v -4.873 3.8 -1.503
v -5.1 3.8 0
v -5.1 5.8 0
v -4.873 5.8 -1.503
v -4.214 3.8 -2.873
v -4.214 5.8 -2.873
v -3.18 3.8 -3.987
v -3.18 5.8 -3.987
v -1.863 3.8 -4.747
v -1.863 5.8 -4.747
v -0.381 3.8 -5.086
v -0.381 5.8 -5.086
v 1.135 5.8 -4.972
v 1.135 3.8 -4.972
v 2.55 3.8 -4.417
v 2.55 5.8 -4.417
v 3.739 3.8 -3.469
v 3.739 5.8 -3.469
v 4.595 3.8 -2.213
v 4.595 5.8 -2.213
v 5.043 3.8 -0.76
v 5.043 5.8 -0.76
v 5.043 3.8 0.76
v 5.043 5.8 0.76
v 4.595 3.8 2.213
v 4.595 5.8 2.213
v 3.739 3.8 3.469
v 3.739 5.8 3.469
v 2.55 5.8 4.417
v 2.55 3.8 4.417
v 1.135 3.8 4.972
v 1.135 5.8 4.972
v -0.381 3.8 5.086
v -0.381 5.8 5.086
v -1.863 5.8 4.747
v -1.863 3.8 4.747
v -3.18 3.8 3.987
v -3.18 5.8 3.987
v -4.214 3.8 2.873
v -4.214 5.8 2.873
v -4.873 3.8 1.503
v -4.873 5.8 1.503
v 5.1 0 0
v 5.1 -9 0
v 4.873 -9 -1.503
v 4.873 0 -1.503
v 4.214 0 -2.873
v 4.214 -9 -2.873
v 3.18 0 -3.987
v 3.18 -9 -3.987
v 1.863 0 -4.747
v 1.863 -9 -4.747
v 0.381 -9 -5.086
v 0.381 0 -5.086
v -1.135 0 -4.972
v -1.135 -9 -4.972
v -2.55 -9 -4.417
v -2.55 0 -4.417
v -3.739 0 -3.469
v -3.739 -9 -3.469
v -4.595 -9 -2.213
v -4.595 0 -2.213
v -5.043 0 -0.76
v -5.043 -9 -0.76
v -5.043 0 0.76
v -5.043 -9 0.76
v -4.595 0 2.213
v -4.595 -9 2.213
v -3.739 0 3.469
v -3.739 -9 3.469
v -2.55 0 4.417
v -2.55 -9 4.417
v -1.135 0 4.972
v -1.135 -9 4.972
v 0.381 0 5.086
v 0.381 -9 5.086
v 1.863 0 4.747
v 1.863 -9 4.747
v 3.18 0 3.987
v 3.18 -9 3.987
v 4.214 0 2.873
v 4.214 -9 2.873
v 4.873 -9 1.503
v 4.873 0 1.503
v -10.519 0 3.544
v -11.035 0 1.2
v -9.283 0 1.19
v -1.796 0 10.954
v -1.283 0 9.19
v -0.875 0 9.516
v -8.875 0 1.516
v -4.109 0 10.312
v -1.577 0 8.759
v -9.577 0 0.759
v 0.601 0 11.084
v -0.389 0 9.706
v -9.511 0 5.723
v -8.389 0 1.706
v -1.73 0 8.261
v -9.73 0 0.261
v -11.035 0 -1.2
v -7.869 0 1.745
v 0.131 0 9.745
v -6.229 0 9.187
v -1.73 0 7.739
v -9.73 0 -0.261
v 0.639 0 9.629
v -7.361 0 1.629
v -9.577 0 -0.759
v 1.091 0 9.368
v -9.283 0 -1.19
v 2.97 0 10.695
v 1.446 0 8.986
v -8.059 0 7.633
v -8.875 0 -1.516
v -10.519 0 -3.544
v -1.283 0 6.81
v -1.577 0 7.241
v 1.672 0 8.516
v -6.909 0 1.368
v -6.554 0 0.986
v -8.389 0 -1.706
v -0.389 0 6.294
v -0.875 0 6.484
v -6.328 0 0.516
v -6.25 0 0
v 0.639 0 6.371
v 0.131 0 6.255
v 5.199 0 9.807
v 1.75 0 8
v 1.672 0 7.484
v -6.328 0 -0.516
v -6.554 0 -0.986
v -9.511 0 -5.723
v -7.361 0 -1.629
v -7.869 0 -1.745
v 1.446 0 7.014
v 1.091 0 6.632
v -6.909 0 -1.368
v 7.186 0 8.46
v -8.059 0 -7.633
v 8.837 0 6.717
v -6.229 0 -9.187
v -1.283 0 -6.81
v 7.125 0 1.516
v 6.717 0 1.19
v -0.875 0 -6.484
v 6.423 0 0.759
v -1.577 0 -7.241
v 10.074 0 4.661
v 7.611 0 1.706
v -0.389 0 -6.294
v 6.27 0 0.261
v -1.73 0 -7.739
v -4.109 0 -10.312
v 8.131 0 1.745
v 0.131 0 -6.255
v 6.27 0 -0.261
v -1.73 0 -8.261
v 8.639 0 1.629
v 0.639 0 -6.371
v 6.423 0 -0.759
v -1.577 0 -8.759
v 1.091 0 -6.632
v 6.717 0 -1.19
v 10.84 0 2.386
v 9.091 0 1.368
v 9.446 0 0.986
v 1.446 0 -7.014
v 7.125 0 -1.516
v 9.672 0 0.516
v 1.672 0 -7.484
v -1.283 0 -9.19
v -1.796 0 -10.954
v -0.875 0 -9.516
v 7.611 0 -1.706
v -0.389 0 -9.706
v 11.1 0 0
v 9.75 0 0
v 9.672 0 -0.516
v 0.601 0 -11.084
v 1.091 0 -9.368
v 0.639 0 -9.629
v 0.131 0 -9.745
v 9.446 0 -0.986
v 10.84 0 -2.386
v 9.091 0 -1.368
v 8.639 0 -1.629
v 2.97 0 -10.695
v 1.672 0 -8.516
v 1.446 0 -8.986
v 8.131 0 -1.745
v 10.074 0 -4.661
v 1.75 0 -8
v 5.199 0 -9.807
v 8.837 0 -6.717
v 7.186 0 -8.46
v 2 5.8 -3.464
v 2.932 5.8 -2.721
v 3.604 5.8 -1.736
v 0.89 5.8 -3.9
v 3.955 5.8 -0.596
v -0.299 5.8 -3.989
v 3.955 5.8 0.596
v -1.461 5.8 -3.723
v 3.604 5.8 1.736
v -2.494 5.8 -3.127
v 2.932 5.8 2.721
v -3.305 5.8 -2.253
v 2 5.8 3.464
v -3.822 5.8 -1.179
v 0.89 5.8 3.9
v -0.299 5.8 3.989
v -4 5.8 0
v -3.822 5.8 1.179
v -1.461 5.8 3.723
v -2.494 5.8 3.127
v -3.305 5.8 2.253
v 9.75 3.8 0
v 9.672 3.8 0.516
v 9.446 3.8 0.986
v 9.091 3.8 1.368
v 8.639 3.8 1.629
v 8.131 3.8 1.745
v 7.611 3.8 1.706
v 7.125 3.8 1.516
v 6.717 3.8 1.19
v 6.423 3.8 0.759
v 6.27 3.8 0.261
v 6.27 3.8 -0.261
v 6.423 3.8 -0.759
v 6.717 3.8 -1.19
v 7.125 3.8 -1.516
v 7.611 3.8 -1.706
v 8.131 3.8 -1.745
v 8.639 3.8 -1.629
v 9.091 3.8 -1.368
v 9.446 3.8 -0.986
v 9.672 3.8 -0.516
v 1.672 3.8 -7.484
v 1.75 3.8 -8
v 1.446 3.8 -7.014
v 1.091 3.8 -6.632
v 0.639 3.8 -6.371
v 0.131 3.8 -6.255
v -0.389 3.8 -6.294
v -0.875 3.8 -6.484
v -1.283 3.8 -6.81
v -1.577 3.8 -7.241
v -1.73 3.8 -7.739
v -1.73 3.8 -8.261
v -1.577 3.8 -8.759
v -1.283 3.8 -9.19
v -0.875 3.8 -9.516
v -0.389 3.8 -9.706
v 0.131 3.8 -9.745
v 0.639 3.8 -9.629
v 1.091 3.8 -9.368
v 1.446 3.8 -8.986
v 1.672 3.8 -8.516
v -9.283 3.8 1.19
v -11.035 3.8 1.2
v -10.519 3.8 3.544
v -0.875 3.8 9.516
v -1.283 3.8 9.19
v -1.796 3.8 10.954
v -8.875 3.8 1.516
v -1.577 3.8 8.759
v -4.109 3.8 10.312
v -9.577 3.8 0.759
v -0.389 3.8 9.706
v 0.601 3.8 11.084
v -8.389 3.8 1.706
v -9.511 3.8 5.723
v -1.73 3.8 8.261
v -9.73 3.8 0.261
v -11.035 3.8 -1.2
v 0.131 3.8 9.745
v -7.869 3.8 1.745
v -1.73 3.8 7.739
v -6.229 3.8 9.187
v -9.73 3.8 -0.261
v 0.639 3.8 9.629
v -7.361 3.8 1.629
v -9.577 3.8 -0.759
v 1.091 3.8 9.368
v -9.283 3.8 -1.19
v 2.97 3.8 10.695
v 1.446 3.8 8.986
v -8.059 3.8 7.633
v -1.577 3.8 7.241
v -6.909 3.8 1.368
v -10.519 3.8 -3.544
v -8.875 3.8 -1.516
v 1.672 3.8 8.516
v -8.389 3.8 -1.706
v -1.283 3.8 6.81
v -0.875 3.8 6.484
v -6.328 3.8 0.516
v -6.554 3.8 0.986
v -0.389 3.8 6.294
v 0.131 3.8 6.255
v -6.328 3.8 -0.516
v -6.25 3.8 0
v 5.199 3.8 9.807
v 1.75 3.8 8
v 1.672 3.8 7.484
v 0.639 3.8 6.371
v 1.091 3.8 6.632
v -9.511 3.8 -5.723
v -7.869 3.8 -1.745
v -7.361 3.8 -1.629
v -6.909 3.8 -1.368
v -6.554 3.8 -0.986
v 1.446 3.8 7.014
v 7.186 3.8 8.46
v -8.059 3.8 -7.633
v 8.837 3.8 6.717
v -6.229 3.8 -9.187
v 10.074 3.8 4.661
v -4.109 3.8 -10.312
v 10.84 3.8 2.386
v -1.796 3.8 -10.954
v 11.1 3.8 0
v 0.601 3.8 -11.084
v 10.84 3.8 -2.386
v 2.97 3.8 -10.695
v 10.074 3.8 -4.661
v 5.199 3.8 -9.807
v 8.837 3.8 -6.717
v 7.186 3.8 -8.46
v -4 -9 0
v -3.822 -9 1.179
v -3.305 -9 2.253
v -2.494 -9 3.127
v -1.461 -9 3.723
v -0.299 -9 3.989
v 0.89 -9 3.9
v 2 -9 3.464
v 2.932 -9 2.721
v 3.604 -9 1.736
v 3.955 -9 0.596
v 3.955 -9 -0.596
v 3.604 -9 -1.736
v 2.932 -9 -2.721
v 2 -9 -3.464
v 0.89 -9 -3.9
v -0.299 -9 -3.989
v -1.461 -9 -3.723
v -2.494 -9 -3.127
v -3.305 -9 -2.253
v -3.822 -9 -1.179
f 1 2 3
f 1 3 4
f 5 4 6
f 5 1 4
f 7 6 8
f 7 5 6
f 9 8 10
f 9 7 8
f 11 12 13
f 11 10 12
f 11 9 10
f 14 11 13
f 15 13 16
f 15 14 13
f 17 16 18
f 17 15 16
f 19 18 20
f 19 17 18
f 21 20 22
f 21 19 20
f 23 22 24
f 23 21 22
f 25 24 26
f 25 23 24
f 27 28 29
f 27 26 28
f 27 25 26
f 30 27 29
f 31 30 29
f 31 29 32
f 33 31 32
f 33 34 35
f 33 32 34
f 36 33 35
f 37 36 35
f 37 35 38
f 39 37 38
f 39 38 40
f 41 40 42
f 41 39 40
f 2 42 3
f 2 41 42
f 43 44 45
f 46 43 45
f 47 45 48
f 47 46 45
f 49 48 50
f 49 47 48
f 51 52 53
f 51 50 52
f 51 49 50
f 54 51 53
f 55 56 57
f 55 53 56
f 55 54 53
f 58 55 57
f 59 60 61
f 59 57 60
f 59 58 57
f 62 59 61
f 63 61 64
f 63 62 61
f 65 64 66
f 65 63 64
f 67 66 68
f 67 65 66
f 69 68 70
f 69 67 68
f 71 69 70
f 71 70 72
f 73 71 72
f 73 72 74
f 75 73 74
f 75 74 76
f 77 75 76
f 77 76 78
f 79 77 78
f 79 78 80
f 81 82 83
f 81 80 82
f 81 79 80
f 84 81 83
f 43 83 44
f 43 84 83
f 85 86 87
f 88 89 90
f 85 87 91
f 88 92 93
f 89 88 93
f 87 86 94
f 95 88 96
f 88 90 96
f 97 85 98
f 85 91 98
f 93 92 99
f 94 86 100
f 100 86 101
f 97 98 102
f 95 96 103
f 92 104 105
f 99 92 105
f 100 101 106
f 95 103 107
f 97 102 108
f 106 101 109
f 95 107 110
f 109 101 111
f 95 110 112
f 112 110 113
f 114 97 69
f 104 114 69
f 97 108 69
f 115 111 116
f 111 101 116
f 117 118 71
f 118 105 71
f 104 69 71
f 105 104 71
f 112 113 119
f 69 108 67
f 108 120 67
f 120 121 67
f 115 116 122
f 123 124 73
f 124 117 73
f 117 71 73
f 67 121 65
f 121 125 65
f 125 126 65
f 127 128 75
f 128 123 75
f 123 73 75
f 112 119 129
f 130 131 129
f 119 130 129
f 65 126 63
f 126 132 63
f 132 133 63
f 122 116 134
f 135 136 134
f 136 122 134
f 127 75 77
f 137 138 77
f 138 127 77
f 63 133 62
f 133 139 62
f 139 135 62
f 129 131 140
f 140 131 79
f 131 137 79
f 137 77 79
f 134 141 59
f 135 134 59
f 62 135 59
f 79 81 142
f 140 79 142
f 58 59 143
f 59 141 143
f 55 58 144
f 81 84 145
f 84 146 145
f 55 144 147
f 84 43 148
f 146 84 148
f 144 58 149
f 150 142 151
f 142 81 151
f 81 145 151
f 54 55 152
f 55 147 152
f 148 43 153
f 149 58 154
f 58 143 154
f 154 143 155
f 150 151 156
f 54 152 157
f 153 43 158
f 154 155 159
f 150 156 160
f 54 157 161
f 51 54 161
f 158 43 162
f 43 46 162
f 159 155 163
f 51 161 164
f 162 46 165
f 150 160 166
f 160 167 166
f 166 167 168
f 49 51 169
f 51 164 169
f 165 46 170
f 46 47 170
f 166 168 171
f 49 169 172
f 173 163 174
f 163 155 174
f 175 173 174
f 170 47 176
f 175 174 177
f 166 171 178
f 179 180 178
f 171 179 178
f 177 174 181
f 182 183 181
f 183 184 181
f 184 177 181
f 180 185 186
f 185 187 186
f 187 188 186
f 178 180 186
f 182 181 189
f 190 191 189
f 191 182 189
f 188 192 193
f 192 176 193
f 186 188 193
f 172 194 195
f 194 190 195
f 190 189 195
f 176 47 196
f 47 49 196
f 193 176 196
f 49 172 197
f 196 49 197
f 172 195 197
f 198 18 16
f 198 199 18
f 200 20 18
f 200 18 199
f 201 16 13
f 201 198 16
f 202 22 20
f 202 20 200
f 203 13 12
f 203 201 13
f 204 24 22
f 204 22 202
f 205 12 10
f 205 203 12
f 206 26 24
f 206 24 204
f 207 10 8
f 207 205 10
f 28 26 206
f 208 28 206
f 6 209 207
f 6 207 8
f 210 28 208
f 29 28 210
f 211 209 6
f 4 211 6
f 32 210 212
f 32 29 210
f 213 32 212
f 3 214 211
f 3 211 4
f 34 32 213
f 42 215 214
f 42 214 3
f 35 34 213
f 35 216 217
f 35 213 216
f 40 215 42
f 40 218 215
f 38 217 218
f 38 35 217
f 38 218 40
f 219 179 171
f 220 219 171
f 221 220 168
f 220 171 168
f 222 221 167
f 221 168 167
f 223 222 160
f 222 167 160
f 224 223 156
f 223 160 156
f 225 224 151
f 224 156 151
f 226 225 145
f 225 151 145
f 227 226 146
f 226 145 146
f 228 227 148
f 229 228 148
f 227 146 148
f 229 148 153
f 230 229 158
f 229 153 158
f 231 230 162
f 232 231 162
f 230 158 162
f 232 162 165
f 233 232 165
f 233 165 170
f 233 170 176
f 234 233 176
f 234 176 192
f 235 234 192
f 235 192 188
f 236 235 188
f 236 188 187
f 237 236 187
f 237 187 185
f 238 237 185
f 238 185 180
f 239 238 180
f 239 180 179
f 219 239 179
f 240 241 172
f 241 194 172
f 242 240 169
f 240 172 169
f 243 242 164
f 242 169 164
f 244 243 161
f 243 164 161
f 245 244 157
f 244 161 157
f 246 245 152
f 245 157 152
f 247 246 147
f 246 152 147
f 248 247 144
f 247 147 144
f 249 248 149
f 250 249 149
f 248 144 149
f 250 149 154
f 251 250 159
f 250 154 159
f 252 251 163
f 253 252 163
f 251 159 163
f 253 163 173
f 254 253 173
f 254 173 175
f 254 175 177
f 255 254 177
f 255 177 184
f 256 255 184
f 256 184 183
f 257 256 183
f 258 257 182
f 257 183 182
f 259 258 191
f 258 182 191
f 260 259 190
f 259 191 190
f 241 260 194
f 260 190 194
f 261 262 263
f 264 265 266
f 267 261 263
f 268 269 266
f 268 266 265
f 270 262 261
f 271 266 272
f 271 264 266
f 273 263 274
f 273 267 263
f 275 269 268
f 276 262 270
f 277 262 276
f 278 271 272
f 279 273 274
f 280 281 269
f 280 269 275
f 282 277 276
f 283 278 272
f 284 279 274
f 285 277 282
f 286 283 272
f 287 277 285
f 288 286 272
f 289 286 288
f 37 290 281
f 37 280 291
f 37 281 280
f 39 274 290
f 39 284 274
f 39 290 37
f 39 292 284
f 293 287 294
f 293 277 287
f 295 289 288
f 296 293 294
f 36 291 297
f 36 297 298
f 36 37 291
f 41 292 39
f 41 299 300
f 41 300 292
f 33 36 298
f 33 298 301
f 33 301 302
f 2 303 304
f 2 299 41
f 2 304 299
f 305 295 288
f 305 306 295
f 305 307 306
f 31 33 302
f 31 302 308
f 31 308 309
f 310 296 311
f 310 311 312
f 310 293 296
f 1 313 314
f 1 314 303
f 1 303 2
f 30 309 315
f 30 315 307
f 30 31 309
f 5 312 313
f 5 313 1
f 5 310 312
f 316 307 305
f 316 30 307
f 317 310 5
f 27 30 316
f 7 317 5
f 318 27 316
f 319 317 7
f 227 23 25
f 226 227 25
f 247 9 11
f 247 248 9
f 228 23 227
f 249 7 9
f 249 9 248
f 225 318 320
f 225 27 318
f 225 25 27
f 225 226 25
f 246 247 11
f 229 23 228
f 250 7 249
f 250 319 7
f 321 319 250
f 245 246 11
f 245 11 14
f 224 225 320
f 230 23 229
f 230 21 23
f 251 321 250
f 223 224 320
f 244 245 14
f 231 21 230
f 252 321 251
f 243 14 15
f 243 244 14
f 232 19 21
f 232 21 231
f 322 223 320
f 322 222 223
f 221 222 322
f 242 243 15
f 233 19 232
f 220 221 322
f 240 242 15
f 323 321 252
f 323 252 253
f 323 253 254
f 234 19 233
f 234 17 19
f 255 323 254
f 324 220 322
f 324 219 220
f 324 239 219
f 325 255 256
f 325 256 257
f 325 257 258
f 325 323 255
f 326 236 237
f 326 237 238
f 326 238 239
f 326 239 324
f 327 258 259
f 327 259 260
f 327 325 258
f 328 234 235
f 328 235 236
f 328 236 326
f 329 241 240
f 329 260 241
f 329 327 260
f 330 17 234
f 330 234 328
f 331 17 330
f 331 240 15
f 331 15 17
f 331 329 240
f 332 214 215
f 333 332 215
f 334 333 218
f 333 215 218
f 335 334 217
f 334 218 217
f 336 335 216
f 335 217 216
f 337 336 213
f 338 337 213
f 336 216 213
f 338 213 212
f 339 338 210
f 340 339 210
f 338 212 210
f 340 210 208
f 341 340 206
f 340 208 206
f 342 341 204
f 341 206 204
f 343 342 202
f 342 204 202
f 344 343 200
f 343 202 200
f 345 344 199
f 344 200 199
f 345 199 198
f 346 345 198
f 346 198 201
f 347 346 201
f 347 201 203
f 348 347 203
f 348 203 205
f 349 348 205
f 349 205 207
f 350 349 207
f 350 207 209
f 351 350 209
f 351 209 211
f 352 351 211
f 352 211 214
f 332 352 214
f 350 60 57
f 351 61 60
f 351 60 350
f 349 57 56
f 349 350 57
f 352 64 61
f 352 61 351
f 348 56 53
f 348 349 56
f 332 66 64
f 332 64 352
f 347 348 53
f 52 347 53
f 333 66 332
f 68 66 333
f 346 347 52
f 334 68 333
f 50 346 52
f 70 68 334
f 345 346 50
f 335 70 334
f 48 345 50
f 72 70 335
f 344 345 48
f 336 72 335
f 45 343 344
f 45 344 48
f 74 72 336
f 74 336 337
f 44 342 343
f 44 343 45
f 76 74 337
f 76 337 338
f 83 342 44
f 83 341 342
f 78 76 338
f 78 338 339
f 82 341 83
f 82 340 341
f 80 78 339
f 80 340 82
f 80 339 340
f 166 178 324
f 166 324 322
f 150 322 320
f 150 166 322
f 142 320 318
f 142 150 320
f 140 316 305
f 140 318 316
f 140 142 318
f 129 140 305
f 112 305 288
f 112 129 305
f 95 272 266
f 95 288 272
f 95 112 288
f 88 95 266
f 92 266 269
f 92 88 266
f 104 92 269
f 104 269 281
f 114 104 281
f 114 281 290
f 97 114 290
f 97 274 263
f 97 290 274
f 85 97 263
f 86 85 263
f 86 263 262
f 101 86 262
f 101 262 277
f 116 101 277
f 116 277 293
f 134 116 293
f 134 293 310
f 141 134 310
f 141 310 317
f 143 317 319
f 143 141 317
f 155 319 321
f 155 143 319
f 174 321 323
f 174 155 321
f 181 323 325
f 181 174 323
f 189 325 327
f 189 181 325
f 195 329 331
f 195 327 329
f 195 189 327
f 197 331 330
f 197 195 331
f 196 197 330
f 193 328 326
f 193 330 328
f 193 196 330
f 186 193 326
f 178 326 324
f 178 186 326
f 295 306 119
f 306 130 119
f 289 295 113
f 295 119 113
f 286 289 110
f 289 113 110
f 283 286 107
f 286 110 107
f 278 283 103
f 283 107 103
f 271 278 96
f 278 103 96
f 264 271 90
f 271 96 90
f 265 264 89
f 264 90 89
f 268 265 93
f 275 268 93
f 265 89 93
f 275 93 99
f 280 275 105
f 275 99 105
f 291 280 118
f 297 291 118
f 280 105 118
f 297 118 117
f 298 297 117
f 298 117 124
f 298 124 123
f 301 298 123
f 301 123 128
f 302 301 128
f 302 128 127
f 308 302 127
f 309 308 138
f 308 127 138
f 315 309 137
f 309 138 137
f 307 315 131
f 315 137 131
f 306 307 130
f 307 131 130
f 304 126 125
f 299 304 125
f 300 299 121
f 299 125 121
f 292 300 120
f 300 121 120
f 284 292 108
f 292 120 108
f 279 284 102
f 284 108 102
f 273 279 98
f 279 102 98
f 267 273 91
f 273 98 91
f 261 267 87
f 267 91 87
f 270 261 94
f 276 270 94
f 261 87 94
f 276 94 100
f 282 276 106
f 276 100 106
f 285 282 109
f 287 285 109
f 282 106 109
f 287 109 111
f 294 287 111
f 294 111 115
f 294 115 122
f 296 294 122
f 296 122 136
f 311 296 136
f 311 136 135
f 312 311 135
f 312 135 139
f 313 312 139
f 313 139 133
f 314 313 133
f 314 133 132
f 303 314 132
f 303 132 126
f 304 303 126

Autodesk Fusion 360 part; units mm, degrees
sketch "Sketch1" plane through (0, 0, 0) normal (0, 1, 0) x (1, 0, 0)
  circle A0 centre (0, 0) radius 11.1
  dimension "d1" = 22.2
extrude "Extrude1" add sketch "Sketch1" along normal blind 3.8
sketch "Sketch2" plane through (0, 0, 0) normal (0, -1, 0) x (1, 0, 0)
  circle A0 centre (0, 0) radius 11.1
  circle A1 centre (0, 0) radius 5.1
  dimension "d4" = 10.2
extrude "Extrude2" add sketch "Sketch2" along normal blind 9 contours A1
sketch "Sketch3" plane through (0, 3.8, 0) normal (0, 1, 0) x (-1, 0, 0)
  circle A0 centre (0, 0) radius 11.1
  circle A1 centre (0, 0) radius 5.1
  dimension "d7" = 10.2
extrude "Extrude3" add sketch "Sketch3" along normal blind 2 contours A1
sketch "Sketch4" plane through (0, 5.8, 0) normal (0, 1, 0) x (-1, 0, 0)
  circle A0 centre (0, 0) radius 5.1
  circle A1 centre (0, 0) radius 4
  dimension "d10" = 8
extrude "Extrude4" cut sketch "Sketch4" against normal blind 17 contours A1
sketch "Sketch5" plane through (0, 0, 0) normal (0, -1, 0) x (1, 0, 0)
  circle A0 centre (0, 0) radius 5.1
  circle A1 centre (0, 0) radius 11.1
  circle A2 centre (0, 0) radius 8
  circle A3 centre (-8, 0) radius 1.75
  line L0 (0, 0) -> (-16, 0)
  line L1 (-16, 0) -> (-16, 13)
  line L2 (-16, 13) -> (0, 13)
  line L3 (0, 13) -> (0, 0)
  line L4 (0, 0) -> (14, 0)
  line L5 (14, 0) -> (14, -12)
  line L6 (14, -12) -> (0, -12)
  line L7 (0, -12) -> (0, 0)
  circle A4 centre (0, 8) radius 1.75
  circle A5 centre (0, -8) radius 1.75
  circle A6 centre (8, 0) radius 1.75
  dimension "d13" = 16
  dimension "d14" = 3.5
  dimension "d15" = 3.5
  dimension "d16" = 3.5
  dimension "d17" = 3.5
extrude "Extrude5" cut sketch "Sketch5" against normal blind 7 contours A2 L4 A6 | A2 L4 A6 | A2 L3 A4 | A2 L3 A4 | A2 L7 A5 | A2 L7 A5 | A2 L4 A6 | A2 L4 A6 | A2 A3 L0 | A2 A3 L0 | A2 L3 A4 | A2 L3 A4 | A2 L7 A5 | A2 L7 A5 | A2 A3 L0 | A2 A3 L0
